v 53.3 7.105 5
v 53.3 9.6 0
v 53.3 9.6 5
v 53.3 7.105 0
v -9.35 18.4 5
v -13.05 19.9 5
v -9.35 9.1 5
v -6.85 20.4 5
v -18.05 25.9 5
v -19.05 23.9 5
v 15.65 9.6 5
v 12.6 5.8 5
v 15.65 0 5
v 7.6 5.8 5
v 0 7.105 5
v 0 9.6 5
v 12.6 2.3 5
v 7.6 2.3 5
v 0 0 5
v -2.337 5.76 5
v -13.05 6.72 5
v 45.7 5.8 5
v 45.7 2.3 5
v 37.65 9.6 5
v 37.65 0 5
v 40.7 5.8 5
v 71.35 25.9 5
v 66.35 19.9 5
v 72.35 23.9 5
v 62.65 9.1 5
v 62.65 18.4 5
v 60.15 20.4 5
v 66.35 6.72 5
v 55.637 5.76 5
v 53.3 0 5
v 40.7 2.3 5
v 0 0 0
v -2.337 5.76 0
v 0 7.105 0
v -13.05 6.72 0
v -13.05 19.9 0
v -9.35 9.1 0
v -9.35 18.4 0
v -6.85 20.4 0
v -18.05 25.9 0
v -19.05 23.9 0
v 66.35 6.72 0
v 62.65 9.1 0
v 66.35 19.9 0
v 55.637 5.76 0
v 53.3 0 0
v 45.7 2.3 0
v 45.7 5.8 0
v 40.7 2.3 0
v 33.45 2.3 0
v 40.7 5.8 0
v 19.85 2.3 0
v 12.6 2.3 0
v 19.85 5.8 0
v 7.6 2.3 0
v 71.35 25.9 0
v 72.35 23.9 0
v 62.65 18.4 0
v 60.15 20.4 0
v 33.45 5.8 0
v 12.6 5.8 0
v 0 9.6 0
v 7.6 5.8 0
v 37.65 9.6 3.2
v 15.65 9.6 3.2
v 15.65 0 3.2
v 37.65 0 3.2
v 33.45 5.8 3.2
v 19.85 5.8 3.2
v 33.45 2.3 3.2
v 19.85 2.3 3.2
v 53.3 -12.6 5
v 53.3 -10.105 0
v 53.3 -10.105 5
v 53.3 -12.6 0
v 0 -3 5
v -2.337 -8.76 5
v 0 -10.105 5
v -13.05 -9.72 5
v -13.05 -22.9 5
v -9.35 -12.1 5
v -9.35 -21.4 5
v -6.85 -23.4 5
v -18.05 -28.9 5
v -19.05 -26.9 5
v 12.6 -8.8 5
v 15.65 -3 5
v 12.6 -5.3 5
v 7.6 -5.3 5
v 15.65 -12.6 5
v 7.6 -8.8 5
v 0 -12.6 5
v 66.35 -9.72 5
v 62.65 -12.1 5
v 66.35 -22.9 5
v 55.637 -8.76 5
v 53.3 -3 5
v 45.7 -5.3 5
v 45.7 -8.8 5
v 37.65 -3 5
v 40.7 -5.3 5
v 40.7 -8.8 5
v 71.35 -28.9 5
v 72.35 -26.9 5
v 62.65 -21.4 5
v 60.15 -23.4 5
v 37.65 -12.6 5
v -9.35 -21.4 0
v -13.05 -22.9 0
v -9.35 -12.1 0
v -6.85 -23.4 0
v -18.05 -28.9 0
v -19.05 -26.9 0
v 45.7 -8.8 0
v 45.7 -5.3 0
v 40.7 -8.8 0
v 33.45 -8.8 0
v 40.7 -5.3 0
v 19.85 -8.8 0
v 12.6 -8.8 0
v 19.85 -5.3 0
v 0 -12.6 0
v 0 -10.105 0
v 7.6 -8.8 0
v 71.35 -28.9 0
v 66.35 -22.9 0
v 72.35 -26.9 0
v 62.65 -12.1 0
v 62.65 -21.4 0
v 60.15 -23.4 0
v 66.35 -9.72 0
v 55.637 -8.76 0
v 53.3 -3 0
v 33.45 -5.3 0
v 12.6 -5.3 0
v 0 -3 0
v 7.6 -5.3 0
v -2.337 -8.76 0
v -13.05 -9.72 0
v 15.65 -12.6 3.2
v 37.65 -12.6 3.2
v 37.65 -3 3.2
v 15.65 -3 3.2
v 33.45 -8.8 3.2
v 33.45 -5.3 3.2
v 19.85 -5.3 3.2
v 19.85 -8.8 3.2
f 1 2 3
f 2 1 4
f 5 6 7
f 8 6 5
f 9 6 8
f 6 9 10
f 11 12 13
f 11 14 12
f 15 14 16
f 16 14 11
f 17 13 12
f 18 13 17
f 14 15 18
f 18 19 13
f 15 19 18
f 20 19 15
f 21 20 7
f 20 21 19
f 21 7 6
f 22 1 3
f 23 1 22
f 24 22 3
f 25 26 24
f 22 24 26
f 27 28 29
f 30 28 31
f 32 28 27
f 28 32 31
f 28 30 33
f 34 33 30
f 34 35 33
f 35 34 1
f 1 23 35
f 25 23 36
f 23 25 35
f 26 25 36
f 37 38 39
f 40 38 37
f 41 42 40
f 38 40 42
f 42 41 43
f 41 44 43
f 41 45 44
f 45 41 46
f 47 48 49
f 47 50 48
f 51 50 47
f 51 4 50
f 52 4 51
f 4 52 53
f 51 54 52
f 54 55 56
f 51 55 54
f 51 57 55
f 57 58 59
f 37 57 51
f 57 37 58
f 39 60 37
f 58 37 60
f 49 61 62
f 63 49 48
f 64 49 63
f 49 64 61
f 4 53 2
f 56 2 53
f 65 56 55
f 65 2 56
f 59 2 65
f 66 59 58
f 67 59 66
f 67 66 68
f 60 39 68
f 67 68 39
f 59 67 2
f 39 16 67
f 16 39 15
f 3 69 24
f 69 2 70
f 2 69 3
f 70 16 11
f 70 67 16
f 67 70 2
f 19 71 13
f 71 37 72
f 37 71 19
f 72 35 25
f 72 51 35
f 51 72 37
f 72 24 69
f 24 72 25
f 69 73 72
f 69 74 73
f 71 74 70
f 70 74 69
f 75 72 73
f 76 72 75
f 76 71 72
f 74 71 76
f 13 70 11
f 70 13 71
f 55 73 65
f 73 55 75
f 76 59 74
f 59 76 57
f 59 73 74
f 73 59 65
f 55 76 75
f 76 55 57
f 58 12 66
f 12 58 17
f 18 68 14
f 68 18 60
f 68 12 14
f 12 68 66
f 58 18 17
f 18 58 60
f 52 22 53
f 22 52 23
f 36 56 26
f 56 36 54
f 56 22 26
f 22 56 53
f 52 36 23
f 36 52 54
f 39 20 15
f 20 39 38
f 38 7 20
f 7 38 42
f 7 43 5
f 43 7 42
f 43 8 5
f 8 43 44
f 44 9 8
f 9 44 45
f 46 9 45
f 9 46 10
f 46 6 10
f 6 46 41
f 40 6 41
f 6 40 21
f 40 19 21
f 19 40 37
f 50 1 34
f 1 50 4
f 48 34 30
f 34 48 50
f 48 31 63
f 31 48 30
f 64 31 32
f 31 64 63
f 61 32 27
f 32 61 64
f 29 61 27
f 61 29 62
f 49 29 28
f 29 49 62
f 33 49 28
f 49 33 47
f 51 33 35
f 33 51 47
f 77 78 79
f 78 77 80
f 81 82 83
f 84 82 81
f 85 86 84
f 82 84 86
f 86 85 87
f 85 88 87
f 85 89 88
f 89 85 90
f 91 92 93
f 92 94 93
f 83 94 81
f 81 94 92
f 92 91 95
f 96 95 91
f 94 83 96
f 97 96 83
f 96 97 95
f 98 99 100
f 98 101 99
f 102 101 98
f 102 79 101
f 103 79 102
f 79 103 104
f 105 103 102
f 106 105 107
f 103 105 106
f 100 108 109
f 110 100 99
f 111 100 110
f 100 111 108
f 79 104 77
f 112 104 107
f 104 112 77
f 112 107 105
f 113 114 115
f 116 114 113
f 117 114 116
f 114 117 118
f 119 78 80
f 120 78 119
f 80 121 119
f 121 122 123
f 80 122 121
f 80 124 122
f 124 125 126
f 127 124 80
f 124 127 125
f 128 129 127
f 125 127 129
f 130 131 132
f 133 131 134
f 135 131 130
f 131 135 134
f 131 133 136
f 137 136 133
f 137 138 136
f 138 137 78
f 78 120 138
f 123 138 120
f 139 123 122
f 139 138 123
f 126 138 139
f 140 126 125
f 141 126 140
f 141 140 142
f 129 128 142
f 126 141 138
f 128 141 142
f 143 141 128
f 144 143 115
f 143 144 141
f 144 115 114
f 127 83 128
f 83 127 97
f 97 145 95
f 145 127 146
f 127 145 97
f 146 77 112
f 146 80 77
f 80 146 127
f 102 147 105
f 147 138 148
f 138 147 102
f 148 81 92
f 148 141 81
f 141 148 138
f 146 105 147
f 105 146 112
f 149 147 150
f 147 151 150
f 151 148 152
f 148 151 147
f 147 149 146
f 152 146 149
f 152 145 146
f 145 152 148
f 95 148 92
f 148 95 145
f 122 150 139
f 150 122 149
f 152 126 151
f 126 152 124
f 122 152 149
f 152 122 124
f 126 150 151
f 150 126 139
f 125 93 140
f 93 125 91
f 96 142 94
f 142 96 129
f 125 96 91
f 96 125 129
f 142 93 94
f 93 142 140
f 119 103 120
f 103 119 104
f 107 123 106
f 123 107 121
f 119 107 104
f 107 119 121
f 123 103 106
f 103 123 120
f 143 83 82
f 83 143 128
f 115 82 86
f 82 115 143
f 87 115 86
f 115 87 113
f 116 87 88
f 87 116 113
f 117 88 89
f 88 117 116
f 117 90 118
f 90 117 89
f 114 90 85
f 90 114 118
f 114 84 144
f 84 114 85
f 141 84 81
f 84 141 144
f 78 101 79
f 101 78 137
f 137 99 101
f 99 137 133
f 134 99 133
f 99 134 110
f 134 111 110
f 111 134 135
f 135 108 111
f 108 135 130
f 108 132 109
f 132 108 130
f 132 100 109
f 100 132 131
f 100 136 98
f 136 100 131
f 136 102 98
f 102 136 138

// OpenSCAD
// in mm.  ZTE Speed is 66, Moto E4 is 72
phone_width = 72; // [54:0.5:100]

// in mm.  ZTE Speed is 10.2, Moto E4 is 9.3
phone_thickness = 9.3; //[5:0.1:20]

// in mm.  Original ServoCity clip thickness is 3.2, suggest 5 for added strength
clip_thickness=5; //[3.2:0.1:7.0]

// two clips or single clip?
two_clips="true"; //[true,false]



// preview[view:south, tilt:top]

/* [Hidden] */
ht=3.2;
cWid=3.7; // mm. width of clips

i2m = 25.4; // inches to mm

// base with slots
bLen=53.3;
bWid=9.6;

wholeClip();


if (two_clips=="true") {
translate([0,-3,0])
mirror([0,1,0])
wholeClip();
}

module wholeClip() {

difference() {
    
    cube([bLen, bWid, clip_thickness]);
    
    if (clip_thickness>3.2) {
    translate([bLen/2-(22)/2, 0,ht])
    cube([22, bWid+2, clip_thickness]);
    }
    
    translate([bLen/2-(13.3+0.3)/2, 2.3, -2])
    cube([13.3+0.3, ht+0.3, 10]);
    
    translate([bLen/2-1.5/2*i2m, 2.3, -2])
    cube([5,ht+0.3, 10]);
    
    translate([bLen/2+1.5/2*i2m -5, 2.3, -2])
    cube([5,ht+0.3, 10]);
}

clip();

translate([bLen,0,0])
mirror([1,0,0])
clip();

module clip() {
linear_extrude(height=clip_thickness)
polygon([
[0,0],
[bLen/2 - phone_width/2-cWid, bWid*0.7],
[bLen/2 - phone_width/2-cWid, bWid+phone_thickness+1],
[bLen/2 - phone_width/2-6-cWid, bWid+phone_thickness+5],
[bLen/2 - phone_width/2-5-cWid, bWid+phone_thickness+7],
[bLen/2 - phone_width/2 +2.5, bWid+phone_thickness+1.5],
[bLen/2 - phone_width/2 , bWid+phone_thickness-0.5],
[bLen/2 - phone_width/2 , bWid-0.5],
[(bLen/2 - phone_width/2)/4 , bWid*0.6],
[1,bWid*0.8]]);
}

}
